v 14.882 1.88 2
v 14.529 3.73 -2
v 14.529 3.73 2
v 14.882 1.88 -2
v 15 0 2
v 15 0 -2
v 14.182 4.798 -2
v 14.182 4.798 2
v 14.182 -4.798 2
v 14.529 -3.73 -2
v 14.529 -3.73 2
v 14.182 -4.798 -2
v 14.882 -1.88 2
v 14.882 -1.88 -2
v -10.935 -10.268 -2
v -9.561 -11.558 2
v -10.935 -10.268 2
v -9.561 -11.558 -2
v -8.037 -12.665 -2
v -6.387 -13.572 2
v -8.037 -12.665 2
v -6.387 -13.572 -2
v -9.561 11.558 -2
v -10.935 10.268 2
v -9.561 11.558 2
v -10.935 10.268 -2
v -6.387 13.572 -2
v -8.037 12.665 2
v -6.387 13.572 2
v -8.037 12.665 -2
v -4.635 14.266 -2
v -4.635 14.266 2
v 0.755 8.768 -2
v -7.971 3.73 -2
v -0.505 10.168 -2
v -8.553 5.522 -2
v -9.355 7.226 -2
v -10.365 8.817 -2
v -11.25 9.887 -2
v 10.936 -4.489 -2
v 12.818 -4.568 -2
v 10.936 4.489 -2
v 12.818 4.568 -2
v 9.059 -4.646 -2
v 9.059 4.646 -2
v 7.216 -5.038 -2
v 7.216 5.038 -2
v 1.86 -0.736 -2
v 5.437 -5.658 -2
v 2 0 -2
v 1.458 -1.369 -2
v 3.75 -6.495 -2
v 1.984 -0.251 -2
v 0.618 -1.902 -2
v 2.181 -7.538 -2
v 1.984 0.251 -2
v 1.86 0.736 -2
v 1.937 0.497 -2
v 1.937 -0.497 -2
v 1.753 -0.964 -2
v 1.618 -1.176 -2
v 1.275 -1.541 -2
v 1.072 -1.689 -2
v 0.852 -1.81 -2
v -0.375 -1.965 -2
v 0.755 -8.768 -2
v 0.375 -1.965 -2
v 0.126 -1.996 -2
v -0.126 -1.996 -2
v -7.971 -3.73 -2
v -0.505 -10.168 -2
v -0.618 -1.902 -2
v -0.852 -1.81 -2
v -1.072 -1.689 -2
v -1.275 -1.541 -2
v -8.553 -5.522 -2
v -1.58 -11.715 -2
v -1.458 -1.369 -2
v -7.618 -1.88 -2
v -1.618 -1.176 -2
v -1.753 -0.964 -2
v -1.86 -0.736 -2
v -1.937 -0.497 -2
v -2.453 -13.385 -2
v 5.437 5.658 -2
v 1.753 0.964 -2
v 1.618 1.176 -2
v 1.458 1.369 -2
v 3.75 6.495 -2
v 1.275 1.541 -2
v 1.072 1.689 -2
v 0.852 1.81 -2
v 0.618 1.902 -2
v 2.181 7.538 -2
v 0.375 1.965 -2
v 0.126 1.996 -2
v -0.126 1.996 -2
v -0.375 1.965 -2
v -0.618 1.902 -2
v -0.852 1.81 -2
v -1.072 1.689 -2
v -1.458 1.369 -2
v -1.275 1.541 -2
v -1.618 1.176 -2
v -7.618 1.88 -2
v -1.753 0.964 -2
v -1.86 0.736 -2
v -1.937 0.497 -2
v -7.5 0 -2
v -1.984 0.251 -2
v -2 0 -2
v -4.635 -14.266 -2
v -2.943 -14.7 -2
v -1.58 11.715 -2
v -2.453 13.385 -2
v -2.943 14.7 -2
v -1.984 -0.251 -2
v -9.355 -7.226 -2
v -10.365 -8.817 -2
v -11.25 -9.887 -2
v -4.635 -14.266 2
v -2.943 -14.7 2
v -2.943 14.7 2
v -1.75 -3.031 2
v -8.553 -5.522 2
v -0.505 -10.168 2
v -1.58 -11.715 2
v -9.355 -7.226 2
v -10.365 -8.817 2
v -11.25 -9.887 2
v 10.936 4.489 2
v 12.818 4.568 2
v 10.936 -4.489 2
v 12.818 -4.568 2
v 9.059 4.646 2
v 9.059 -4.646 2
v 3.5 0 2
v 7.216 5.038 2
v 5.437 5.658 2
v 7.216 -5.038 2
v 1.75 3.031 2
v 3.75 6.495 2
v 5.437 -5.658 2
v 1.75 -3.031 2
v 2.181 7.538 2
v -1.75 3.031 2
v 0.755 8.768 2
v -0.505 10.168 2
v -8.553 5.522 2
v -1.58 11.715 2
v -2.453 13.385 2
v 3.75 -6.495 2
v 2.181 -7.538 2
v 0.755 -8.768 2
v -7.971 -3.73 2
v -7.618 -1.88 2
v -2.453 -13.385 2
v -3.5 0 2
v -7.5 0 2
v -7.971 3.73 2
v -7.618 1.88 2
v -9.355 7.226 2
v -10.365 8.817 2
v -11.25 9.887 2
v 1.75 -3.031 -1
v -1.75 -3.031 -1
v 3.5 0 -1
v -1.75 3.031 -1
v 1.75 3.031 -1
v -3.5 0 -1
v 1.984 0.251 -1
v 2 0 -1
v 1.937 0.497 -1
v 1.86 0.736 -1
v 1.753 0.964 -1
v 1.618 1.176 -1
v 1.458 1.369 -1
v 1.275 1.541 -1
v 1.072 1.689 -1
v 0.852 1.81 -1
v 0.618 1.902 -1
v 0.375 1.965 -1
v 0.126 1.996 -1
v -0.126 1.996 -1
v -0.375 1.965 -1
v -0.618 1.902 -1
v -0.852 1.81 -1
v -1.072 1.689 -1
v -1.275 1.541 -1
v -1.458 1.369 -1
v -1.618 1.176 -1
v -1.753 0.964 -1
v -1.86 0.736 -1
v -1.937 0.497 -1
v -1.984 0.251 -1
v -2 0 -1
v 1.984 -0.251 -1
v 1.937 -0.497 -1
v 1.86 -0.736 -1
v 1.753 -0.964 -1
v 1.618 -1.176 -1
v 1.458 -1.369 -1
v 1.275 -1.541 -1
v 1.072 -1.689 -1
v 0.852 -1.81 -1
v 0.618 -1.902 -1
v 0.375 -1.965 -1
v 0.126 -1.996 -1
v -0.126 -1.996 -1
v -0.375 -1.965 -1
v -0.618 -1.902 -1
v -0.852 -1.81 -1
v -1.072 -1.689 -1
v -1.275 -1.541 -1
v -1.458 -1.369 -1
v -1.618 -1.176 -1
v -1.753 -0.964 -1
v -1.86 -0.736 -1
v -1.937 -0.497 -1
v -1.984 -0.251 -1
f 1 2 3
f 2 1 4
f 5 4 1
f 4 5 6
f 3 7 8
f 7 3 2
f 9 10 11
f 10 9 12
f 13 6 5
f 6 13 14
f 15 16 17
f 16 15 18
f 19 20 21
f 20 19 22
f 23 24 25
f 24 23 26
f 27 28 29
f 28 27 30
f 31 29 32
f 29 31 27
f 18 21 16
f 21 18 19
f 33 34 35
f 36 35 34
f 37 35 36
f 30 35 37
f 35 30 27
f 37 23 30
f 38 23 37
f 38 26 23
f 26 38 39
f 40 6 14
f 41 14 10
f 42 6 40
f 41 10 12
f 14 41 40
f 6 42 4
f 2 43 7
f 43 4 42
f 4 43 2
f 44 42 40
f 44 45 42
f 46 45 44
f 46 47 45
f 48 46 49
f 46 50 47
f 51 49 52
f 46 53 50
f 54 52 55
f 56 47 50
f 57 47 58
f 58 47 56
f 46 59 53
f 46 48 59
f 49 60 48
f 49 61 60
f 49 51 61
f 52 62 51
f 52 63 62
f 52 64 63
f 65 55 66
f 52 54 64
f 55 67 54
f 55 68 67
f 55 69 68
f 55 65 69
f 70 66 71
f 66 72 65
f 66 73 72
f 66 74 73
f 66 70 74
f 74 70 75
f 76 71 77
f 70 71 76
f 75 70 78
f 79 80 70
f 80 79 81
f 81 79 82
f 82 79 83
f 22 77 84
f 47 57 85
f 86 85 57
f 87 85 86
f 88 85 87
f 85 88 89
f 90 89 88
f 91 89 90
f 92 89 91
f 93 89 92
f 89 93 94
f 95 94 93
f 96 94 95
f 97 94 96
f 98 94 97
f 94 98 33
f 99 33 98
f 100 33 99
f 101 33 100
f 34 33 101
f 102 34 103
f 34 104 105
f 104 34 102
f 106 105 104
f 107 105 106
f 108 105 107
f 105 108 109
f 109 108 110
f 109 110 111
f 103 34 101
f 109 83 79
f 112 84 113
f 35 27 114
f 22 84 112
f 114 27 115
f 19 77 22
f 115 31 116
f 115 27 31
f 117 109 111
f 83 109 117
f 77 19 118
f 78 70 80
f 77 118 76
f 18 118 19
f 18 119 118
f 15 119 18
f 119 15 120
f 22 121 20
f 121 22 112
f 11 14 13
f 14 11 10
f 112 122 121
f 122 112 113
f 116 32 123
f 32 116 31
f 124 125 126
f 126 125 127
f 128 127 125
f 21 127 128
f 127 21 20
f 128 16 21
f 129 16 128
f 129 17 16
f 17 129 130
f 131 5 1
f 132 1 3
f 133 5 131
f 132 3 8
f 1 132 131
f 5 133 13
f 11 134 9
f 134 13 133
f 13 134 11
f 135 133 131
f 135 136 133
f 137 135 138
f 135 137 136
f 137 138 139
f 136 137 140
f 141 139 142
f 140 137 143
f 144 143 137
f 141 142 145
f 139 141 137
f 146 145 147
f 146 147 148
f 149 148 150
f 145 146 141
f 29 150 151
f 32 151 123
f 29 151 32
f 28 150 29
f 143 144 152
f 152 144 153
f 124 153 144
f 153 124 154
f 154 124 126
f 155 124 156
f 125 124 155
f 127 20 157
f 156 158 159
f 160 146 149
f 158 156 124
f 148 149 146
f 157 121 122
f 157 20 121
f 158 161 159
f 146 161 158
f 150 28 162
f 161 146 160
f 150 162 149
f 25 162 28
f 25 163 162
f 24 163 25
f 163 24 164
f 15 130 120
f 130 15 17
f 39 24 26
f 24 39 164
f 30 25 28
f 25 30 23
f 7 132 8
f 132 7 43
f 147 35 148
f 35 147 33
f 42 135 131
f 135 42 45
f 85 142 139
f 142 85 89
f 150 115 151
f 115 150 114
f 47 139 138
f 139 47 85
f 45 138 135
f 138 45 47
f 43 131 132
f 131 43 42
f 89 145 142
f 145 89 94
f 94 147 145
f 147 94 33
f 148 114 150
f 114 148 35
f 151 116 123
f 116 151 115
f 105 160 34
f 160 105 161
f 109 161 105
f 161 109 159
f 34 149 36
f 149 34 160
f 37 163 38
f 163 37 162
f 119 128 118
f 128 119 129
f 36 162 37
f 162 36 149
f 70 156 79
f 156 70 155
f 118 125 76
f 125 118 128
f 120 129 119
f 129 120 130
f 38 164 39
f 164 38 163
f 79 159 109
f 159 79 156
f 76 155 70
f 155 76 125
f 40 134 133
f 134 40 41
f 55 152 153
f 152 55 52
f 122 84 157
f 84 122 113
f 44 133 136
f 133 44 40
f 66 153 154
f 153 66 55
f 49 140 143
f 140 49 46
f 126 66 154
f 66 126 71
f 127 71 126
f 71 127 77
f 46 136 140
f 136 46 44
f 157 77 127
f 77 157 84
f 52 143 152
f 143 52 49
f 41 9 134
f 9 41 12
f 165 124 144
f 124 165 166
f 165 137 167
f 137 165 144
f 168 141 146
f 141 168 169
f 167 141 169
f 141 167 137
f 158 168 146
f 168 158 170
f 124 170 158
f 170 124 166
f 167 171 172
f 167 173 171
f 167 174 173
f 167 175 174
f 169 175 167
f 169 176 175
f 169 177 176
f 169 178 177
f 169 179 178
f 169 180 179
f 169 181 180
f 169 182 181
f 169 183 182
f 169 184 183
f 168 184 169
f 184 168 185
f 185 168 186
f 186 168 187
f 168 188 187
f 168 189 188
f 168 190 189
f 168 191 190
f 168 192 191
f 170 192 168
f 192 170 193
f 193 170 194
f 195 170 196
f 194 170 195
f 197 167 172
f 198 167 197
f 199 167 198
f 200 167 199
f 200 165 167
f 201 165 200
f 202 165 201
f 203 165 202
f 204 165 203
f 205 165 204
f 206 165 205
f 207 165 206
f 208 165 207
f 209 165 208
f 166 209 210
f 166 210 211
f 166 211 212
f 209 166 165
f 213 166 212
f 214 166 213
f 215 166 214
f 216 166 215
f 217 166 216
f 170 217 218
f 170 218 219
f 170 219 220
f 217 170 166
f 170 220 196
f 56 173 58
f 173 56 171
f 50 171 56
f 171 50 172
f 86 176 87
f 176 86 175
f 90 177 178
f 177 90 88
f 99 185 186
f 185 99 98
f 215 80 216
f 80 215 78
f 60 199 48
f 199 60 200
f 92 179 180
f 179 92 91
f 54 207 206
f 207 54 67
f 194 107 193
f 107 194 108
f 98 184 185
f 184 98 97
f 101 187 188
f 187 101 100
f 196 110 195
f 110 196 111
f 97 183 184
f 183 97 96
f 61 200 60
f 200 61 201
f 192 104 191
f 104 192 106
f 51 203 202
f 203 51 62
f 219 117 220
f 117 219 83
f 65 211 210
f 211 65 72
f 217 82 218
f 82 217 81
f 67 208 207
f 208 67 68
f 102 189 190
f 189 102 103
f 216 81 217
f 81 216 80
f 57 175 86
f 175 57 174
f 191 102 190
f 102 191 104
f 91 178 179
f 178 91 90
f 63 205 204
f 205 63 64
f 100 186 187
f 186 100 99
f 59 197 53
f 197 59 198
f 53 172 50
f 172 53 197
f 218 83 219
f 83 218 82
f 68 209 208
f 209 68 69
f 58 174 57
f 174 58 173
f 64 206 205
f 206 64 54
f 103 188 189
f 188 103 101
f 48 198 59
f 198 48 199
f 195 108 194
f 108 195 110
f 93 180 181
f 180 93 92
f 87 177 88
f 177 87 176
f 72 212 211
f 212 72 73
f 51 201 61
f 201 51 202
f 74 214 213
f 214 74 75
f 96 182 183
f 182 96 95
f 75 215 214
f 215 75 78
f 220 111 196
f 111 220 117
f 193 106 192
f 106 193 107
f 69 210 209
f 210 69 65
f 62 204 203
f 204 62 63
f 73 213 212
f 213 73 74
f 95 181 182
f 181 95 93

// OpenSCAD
// stuff for Thingiverse Customizer
//---------------------------------------------
// (mm)
	diameter=30;
// (mm)
	thickness=4;
// (mm) - measured point-to-point
	hexNutWidth=7;
// (mm)
	holeDiameter=4;

// ensure base is at least 1mm thick
	hexHoleDepth=thickness-1;

//---------------------------------------------

// this geometry works nicely - don't adjust!!!
//---------------------------------------------
	distFromCentre=0.75*diameter;
//---------------------------------------------

// construction
//---------------------------------------------
render(){ // some wrapping to work with Sublime and OpenSCAD
difference(){
//main body
	cylinder(h=thickness, r=diameter/2, center=true, $fn=50);

//cut outs
	rotate([0, 0, 60]) 
	translate([distFromCentre, 0, 0]) 
		cylinder(h=thickness+2, r=diameter/2, center=true, $fn=50);
	translate([-distFromCentre, 0, 0]) 
		cylinder(h=thickness+2, r=diameter/2, center=true, $fn=50);
	rotate([0, 0, -60]) 
	translate([distFromCentre, 0, 0]) 
		cylinder(h=thickness+2, r=diameter/2, center=true, $fn=50);

//hex hole
	rotate([0, 0, 0]) 
	translate([0, 0, thickness-hexHoleDepth]) 
		cylinder(h=thickness, r=hexNutWidth/2, center=true, $fn=6);
		cylinder(h=thickness+2, r=holeDiameter/2, center=true, $fn=50);
}
}
//---------------------------------------------
